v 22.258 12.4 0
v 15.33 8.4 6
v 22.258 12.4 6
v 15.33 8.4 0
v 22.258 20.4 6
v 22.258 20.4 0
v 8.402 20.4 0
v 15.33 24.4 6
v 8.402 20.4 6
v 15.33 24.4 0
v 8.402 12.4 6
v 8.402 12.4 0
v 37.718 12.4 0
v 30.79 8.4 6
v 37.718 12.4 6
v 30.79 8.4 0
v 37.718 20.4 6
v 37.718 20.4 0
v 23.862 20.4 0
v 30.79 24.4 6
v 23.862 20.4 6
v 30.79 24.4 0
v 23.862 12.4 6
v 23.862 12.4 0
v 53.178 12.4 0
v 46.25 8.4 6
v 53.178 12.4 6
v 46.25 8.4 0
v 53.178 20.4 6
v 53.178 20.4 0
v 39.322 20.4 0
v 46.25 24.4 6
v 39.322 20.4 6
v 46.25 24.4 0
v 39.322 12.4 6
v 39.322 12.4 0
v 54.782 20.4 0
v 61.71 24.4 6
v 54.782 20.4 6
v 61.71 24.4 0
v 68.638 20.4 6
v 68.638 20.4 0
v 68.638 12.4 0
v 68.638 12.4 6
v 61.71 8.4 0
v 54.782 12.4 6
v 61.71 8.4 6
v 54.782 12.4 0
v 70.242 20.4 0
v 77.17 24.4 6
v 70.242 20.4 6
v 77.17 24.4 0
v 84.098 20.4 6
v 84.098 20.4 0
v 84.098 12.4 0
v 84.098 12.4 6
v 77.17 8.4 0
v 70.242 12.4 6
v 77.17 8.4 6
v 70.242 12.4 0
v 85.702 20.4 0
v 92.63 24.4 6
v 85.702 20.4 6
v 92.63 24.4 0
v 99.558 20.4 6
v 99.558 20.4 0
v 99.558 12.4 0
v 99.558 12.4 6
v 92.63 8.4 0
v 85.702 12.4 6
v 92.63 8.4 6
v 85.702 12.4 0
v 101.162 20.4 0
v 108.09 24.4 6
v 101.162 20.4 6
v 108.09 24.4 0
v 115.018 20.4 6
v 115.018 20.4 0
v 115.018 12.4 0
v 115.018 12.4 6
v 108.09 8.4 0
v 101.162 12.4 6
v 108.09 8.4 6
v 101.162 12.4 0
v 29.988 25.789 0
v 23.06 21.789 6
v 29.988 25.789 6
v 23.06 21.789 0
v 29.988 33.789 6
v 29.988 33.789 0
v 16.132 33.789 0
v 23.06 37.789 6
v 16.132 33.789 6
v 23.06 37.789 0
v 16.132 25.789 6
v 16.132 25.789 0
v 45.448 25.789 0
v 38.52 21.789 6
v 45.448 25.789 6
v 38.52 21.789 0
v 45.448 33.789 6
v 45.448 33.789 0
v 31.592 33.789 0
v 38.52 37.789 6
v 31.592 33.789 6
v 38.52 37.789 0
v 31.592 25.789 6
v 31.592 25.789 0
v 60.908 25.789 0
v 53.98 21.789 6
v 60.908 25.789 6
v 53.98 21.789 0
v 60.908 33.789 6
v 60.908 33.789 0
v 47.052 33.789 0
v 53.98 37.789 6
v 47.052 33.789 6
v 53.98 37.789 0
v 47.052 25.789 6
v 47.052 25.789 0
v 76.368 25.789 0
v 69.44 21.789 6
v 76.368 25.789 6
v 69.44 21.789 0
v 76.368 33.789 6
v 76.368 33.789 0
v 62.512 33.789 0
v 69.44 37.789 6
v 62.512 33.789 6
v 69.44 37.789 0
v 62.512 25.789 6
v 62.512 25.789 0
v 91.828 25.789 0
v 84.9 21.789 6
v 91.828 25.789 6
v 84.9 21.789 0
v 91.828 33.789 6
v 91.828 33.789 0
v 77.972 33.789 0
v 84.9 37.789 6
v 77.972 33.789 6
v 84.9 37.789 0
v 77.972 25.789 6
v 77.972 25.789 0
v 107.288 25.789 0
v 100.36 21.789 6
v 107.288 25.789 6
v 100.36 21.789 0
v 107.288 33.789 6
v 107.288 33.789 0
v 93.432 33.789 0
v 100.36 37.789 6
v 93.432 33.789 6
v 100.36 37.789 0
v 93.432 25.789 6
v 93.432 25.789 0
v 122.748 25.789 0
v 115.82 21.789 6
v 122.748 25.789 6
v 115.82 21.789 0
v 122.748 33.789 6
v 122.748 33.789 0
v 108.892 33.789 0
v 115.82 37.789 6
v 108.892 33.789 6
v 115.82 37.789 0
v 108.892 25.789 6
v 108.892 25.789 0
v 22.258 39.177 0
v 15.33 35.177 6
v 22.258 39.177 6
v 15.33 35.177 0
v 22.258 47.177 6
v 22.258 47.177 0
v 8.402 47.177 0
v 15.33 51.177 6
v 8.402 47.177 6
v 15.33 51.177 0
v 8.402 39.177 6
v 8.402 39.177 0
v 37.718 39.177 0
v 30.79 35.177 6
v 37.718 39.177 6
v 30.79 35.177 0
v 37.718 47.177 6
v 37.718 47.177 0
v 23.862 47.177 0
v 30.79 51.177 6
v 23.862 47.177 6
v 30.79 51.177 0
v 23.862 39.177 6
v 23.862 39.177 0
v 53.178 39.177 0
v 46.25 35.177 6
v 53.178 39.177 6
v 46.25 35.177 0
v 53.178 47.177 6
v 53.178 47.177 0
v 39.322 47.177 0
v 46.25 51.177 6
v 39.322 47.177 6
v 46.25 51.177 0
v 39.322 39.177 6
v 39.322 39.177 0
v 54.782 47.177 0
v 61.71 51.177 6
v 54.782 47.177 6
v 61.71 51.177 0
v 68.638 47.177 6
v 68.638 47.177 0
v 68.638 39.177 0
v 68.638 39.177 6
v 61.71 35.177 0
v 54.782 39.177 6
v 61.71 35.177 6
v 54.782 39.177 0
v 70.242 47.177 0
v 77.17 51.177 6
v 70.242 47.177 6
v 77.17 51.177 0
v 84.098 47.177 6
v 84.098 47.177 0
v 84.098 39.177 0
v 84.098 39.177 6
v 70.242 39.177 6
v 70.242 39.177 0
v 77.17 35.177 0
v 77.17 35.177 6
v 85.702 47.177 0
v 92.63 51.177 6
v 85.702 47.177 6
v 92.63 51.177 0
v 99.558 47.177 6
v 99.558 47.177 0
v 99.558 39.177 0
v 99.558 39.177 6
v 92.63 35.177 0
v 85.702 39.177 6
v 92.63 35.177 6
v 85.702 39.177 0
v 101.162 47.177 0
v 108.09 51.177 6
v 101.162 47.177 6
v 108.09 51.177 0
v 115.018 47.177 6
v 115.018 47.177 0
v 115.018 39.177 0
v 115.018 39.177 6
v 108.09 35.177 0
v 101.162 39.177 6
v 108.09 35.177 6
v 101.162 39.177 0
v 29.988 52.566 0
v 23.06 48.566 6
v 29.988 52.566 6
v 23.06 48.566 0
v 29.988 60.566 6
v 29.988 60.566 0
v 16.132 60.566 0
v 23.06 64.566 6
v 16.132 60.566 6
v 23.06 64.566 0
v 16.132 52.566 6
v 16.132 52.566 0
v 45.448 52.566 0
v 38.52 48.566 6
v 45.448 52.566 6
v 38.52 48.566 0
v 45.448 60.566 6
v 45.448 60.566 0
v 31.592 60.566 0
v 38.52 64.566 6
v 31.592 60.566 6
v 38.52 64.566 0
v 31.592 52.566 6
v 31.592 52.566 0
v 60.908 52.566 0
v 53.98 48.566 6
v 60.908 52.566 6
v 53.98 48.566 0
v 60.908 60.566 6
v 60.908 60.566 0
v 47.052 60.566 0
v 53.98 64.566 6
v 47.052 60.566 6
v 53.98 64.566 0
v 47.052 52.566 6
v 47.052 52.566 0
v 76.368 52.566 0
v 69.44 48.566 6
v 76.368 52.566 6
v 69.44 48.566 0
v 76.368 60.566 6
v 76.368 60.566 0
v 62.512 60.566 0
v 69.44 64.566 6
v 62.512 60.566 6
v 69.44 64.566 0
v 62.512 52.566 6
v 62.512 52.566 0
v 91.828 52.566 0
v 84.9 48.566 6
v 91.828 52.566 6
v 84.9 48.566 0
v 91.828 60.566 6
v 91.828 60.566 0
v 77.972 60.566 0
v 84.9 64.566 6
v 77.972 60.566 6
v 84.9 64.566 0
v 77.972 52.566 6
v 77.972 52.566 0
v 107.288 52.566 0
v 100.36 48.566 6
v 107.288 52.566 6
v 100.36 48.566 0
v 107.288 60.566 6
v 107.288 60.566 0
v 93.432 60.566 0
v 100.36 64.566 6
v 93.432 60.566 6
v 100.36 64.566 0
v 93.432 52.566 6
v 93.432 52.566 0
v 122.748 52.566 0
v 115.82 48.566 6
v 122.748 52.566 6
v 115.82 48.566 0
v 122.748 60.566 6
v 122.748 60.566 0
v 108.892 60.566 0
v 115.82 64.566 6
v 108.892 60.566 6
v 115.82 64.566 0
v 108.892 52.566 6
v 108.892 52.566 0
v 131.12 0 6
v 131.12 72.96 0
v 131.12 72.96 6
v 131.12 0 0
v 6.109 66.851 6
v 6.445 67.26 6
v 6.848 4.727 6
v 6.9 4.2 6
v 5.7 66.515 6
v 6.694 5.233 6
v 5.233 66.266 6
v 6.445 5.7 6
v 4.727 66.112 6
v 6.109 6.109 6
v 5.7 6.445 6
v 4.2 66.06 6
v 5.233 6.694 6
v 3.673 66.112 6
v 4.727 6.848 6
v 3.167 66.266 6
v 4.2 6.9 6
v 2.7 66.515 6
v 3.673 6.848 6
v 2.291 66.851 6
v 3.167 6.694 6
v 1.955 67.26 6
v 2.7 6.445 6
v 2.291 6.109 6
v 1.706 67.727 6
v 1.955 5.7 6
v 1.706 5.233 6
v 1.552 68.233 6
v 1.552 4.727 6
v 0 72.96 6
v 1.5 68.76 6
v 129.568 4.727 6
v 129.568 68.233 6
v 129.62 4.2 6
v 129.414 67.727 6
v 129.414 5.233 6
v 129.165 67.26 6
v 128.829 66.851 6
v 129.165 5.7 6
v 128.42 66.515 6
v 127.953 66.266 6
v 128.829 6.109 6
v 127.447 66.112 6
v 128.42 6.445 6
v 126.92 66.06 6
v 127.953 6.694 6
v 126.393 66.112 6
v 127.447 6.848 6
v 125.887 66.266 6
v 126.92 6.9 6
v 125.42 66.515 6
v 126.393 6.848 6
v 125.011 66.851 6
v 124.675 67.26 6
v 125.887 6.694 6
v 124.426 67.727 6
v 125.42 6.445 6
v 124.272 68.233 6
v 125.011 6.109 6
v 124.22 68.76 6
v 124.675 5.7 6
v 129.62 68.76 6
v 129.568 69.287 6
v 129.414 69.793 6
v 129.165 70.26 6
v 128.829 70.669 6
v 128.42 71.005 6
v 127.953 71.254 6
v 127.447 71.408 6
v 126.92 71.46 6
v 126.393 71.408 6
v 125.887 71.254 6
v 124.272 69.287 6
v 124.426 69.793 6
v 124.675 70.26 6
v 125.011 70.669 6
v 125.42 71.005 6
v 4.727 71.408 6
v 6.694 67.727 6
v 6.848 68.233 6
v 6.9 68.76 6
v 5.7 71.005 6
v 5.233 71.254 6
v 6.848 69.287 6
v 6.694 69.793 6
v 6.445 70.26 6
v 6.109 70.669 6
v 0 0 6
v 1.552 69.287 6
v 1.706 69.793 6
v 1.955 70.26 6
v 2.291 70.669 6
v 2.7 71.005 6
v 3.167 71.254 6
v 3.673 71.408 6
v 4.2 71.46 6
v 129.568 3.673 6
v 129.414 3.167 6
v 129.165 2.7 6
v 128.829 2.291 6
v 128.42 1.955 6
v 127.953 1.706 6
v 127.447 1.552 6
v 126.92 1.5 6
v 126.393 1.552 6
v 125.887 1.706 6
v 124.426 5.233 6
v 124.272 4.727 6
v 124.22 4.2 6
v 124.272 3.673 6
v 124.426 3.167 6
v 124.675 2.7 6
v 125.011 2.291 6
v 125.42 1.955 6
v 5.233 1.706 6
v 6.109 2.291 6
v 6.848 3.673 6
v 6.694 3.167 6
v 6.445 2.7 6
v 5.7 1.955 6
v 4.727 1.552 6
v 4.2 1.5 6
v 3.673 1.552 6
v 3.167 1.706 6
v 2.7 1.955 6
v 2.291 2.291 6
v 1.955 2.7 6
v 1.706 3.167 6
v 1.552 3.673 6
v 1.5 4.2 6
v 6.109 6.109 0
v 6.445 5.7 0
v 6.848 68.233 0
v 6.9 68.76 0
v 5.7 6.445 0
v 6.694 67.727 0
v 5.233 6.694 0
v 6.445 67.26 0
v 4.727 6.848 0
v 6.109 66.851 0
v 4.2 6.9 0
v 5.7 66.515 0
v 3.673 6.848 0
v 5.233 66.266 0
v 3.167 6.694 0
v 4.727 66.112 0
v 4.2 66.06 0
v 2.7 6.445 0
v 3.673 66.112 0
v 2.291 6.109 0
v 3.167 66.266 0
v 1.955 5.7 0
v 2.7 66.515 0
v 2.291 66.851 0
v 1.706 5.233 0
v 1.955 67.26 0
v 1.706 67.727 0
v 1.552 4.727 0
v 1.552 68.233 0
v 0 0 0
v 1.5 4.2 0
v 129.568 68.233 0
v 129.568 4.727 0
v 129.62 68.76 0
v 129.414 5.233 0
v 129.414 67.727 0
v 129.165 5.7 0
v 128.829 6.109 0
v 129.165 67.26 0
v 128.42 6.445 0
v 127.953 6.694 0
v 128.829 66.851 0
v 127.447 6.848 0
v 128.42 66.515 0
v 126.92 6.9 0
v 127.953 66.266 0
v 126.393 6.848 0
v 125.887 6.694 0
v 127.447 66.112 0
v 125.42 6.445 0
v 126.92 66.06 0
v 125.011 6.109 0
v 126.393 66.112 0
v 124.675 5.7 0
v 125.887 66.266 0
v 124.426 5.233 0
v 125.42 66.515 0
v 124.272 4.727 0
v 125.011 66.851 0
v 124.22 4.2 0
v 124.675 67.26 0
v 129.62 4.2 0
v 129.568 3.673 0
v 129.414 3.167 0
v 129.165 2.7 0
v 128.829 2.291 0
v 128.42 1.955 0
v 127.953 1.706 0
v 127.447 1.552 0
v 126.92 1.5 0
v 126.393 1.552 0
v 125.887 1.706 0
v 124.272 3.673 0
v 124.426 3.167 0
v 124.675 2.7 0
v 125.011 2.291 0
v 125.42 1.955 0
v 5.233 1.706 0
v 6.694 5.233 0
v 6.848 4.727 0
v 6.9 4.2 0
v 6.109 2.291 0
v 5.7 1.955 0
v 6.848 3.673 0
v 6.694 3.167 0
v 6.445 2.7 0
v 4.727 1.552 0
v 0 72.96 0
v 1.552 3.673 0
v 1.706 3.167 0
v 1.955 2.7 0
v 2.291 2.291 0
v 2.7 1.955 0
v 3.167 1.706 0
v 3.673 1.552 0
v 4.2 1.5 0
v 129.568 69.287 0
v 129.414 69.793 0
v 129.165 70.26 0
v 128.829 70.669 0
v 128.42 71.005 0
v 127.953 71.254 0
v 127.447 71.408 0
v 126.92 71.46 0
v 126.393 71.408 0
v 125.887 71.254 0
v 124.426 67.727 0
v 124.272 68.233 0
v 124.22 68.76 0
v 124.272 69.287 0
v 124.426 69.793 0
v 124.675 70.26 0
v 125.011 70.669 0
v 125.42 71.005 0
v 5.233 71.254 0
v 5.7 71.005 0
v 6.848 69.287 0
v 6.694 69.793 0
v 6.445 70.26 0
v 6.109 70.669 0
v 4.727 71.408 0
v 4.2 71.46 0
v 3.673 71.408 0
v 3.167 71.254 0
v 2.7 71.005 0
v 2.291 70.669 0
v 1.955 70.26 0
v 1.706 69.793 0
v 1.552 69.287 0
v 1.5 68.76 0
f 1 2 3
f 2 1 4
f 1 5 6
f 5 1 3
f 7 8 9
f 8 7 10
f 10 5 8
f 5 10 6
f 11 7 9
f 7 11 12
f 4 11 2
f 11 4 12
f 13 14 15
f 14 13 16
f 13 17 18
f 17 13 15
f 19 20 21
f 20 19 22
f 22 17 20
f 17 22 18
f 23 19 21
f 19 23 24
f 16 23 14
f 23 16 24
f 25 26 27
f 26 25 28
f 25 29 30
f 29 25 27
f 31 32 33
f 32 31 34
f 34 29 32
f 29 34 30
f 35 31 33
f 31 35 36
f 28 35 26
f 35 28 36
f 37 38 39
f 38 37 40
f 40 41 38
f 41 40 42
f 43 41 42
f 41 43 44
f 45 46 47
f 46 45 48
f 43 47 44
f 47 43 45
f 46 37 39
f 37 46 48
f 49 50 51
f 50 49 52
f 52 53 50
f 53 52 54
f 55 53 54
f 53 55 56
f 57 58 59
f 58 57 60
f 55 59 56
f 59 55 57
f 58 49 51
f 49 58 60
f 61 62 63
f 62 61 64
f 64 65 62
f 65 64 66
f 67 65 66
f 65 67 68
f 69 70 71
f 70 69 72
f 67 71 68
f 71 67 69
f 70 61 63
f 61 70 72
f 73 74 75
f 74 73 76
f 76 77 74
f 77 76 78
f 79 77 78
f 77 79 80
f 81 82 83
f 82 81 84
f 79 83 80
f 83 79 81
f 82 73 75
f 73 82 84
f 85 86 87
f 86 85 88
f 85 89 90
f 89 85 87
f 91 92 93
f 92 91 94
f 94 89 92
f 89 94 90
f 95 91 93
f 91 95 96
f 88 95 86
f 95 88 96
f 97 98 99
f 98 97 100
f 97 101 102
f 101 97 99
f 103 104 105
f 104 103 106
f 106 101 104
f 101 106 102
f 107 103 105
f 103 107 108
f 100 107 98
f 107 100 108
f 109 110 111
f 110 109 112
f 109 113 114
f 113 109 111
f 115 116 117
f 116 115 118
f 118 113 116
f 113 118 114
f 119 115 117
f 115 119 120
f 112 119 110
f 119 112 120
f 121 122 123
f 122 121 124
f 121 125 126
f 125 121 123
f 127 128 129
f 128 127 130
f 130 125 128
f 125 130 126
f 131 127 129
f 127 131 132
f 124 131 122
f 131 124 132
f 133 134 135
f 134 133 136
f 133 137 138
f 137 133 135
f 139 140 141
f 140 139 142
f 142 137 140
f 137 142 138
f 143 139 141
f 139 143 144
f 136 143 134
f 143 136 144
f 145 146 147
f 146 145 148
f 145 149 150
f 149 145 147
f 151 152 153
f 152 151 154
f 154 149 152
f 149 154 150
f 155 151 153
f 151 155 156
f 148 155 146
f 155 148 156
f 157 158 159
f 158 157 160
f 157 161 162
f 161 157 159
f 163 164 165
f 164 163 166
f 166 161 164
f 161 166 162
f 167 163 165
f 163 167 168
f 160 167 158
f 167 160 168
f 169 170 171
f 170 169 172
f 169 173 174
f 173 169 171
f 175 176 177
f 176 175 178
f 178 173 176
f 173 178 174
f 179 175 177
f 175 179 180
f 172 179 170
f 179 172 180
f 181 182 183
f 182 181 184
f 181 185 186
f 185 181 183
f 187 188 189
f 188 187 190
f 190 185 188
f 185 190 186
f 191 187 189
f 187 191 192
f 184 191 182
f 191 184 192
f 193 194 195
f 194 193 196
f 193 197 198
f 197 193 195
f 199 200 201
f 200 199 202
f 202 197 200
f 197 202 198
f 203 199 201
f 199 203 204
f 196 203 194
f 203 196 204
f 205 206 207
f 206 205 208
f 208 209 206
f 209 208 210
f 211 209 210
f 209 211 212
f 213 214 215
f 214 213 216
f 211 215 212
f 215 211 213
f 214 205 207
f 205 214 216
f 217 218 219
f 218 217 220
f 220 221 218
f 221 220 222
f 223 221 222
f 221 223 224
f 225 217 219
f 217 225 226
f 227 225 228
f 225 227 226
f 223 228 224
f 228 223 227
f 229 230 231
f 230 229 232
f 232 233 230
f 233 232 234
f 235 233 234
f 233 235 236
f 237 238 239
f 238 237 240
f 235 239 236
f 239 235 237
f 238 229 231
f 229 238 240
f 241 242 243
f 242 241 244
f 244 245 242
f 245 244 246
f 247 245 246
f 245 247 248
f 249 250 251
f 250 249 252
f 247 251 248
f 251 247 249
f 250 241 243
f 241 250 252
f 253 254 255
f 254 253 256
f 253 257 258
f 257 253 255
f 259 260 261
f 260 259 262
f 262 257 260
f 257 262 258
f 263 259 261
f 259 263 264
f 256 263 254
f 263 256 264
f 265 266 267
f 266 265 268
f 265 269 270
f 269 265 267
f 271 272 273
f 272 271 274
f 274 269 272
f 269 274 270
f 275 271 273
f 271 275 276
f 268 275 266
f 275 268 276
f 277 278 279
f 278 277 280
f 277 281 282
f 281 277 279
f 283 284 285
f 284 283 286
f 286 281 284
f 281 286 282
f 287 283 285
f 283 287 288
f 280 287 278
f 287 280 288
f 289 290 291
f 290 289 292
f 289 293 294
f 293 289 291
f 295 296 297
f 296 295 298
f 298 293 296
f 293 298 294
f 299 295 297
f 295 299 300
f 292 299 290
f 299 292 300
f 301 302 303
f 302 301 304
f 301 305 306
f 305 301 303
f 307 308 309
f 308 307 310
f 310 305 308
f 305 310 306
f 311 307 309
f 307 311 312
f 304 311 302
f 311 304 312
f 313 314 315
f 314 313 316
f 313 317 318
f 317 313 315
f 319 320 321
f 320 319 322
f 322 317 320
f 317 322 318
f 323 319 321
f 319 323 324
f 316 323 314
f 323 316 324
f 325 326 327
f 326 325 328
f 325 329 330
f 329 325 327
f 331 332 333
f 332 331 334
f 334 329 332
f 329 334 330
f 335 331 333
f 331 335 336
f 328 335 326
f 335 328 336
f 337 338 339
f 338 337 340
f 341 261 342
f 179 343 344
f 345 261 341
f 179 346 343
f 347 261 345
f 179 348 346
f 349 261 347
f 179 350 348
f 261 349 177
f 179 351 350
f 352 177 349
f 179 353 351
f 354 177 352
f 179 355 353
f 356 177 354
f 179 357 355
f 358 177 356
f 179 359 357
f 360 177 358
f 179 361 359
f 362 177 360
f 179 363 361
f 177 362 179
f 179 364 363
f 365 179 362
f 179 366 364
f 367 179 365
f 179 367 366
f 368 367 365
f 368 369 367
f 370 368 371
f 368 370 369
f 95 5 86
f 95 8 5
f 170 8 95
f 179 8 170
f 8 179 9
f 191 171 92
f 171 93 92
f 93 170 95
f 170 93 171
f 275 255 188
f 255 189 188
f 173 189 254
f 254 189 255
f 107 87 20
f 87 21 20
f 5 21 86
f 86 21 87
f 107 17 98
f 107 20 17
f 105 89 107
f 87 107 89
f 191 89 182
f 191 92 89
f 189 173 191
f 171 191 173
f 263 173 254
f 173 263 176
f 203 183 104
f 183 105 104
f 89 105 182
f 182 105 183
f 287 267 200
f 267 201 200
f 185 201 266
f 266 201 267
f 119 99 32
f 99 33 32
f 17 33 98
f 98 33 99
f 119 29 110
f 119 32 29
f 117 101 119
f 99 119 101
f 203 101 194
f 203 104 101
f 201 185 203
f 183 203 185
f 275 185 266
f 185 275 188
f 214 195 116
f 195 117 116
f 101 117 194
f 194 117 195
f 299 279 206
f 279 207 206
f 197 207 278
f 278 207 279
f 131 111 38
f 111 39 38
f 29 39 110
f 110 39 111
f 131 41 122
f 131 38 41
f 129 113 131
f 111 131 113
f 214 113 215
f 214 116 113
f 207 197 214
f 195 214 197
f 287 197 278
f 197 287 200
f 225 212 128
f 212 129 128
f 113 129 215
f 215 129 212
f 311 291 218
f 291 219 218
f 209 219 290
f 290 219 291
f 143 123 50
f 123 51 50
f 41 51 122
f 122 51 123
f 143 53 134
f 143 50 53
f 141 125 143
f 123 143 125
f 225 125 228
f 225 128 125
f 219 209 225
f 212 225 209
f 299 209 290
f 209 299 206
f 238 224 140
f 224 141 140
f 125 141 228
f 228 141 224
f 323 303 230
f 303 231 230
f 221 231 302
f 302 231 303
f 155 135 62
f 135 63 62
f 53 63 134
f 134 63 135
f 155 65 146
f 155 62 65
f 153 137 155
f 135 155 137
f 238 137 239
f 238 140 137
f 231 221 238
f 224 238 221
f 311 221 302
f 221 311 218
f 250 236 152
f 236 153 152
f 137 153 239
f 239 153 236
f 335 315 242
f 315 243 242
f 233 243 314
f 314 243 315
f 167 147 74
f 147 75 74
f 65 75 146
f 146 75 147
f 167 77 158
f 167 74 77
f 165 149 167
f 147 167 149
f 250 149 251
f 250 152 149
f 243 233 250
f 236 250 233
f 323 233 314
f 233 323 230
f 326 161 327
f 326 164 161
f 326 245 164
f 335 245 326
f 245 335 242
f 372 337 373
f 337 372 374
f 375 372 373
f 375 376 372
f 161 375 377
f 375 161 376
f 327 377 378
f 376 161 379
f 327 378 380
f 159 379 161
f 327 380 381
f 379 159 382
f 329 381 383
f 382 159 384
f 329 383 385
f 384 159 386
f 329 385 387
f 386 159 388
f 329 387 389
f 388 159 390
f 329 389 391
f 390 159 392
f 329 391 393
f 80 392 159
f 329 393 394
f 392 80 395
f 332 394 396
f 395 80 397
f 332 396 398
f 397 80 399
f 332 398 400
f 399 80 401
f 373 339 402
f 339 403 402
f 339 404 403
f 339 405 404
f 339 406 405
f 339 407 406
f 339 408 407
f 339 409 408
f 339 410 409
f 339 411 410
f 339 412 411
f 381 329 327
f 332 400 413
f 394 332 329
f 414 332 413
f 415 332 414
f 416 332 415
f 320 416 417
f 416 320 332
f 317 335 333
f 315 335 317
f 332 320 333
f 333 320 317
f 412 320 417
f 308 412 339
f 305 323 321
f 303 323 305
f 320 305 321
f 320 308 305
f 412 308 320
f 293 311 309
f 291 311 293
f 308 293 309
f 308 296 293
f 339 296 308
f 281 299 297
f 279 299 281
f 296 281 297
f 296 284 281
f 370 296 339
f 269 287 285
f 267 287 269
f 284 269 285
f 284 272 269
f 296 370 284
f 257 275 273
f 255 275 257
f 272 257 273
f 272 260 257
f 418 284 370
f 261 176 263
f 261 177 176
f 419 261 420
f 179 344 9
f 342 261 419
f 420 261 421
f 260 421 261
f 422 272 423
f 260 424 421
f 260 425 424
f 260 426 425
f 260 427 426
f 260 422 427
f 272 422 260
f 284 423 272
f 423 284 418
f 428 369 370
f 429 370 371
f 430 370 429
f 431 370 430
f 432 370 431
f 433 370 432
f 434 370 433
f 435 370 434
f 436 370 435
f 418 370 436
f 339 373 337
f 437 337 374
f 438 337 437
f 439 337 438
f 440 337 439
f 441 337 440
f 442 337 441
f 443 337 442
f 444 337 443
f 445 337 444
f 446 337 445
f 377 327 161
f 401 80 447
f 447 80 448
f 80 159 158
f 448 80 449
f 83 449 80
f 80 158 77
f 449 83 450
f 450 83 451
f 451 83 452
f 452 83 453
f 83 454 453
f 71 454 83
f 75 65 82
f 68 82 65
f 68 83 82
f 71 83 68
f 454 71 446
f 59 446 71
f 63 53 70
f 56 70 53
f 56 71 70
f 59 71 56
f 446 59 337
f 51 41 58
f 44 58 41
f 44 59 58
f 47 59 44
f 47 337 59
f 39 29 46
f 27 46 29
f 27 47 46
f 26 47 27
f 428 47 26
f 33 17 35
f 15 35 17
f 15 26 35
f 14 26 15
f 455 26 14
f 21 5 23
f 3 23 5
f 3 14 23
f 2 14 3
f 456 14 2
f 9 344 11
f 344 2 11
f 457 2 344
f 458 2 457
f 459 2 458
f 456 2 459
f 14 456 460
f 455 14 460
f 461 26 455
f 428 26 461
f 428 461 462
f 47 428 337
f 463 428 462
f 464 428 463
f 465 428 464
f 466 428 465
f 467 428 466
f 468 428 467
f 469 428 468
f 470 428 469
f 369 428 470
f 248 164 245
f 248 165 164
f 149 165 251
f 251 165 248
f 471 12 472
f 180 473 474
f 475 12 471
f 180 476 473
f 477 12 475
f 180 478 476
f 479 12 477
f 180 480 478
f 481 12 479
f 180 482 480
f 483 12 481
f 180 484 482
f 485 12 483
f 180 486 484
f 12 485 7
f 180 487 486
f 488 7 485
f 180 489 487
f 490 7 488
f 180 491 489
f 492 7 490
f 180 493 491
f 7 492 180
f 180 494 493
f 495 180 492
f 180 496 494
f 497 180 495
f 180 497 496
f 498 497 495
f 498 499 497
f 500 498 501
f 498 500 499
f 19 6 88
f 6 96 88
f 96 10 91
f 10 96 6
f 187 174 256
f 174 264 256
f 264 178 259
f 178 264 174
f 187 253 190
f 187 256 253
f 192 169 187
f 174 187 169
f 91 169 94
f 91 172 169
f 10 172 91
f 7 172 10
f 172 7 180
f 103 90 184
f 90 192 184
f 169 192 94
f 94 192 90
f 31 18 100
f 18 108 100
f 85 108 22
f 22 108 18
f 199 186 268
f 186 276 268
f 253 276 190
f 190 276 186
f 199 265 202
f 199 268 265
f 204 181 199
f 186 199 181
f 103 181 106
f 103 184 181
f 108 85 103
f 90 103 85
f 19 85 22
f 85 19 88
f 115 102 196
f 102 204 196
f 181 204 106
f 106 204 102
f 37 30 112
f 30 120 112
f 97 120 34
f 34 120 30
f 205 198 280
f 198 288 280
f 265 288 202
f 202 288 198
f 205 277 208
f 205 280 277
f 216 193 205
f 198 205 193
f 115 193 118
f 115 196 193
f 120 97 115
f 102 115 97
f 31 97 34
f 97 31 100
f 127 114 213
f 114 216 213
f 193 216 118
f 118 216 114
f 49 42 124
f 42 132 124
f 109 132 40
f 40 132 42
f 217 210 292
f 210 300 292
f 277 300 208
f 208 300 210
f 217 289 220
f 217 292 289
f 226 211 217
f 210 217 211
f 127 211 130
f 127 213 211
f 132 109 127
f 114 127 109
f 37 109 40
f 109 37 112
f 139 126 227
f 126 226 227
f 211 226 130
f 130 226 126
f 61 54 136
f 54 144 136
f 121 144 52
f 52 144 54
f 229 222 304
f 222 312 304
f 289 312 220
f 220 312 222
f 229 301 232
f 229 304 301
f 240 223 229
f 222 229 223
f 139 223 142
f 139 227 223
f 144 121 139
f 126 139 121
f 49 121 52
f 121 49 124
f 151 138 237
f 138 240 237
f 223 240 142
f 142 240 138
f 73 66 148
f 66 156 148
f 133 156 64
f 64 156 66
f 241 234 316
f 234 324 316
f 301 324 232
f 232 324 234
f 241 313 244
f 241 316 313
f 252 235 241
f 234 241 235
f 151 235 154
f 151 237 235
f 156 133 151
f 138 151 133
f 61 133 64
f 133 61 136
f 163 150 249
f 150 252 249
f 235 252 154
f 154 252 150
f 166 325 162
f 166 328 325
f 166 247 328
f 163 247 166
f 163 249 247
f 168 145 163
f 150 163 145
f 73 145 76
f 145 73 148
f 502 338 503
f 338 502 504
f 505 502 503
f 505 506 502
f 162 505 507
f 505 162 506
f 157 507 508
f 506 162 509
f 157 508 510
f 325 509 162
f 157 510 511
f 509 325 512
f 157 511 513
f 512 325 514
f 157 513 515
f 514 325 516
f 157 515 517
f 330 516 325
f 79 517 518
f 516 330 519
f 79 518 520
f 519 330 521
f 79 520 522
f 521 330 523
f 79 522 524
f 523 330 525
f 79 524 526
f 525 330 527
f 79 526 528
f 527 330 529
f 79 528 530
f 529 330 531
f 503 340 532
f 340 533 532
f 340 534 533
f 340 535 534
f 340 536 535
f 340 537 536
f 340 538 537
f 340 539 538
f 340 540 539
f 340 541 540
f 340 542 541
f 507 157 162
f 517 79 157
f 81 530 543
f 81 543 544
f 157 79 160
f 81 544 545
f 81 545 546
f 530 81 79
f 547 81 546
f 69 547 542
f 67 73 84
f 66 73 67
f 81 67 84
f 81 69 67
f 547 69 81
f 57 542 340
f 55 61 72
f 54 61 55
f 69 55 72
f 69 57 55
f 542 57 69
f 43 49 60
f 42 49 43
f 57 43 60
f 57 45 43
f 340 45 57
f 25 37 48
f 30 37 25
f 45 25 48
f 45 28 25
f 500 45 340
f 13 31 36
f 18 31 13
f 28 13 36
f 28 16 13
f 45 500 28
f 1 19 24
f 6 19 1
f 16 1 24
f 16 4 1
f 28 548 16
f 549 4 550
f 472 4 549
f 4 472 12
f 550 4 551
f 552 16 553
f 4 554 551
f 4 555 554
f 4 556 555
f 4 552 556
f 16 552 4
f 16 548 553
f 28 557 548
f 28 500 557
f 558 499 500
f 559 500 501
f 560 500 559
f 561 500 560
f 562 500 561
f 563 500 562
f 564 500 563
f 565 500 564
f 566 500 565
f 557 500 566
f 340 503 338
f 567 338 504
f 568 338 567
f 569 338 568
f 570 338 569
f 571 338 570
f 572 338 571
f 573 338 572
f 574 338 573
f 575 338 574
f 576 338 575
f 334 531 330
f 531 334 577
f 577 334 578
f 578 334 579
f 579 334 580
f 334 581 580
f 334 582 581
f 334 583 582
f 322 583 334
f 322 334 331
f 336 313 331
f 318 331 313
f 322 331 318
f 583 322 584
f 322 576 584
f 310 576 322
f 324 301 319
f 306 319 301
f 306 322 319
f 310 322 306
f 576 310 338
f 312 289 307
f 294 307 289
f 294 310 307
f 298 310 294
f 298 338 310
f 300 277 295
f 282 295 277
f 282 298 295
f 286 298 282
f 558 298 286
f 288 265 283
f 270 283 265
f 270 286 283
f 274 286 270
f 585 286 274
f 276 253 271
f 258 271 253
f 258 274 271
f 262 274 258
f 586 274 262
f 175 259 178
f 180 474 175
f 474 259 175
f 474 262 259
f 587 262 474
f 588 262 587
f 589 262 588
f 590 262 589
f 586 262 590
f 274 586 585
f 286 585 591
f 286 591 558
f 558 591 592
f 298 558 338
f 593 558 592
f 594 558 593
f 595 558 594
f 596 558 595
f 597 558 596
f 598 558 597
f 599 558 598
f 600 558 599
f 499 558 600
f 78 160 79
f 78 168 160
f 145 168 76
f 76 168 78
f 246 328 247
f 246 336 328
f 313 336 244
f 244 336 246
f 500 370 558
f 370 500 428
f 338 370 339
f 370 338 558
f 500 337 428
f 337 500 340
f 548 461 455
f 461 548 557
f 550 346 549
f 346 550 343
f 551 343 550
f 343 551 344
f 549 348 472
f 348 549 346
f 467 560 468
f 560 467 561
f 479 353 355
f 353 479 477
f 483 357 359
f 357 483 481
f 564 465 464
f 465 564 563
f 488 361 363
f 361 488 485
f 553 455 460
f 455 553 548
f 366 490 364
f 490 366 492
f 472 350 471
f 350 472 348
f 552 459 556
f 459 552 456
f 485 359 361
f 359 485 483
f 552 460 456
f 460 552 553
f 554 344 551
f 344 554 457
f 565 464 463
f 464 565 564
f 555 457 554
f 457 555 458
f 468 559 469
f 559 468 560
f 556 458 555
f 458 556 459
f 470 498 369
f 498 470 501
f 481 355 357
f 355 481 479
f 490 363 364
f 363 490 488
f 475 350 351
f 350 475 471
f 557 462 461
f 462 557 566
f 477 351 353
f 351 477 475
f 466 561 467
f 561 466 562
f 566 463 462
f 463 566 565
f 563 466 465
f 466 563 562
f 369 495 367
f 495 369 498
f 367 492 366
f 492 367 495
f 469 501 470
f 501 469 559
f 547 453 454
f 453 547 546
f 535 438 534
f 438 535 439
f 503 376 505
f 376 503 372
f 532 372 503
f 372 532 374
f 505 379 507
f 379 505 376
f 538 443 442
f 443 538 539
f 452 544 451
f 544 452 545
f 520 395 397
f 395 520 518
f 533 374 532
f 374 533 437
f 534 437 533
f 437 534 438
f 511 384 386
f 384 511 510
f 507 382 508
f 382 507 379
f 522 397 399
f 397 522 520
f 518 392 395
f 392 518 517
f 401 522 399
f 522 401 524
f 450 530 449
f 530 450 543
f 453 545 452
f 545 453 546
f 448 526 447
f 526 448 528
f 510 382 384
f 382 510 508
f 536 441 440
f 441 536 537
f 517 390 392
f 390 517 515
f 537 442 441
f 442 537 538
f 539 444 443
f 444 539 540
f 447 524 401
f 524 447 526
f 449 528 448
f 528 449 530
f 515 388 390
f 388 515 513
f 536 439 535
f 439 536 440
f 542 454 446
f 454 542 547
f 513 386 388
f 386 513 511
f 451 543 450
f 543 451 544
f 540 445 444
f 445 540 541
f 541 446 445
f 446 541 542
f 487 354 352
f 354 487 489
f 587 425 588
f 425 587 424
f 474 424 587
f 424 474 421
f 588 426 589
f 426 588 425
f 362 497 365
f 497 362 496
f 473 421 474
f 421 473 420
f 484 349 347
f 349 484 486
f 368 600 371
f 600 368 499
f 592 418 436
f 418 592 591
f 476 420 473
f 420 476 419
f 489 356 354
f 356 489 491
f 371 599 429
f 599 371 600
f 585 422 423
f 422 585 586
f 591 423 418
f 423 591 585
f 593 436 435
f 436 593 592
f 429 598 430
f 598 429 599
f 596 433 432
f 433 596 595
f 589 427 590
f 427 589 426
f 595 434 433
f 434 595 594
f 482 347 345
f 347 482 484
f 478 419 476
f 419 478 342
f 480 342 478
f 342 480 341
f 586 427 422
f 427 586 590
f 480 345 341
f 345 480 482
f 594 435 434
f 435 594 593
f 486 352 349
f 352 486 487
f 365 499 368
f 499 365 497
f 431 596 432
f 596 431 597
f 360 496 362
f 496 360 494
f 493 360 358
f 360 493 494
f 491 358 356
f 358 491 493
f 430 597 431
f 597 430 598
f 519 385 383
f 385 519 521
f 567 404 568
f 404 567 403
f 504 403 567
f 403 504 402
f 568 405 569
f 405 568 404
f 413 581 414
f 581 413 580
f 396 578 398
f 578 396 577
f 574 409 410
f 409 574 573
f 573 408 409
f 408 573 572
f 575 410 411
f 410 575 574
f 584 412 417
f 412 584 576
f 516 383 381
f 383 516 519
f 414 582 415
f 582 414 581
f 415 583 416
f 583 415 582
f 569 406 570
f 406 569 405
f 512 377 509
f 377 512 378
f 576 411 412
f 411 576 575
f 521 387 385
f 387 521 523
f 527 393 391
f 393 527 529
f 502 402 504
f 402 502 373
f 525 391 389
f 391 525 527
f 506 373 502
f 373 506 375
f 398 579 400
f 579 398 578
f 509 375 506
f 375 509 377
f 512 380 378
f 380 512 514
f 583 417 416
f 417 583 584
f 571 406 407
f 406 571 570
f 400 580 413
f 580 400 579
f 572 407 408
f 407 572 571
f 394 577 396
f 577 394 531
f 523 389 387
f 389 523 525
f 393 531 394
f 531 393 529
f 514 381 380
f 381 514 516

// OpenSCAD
$fn = 32;

// ----------------------------------------------------------------------
// Honeycomb panel: 131.12 x 72.96 mm, 28 cells of 16 mm
// ----------------------------------------------------------------------

// --- parameters (mm) ---
panel_w = 131.12;         // panel width
panel_d = 72.96;          // panel depth
thick = 6;                // panel thickness
cell_r = 8;               // hex cell circumradius
pitch = 15.46;            // hex cell pitch (centre to centre)
web = 1.6;                // web between the cells
columns = 7;              // columns of cells
rows = 4;                 // rows of cells
cell_count = 28;          // total cells
shift_x = 15.33;          // first cell offset in x
shift_y = 16.4;           // first cell offset in y
mount_d = 5.4;            // corner mounting holes
hole_off = 4.2;           // mounting hole offset from the corners

difference() {
  union() {
    cube([panel_w, panel_d, thick]);
  }
  /* hexagonal cells, point-up, cut right through the plate */
  for (row = [0 : rows - 1]) {
    for (col = [0 : columns - 1]) {
      translate([shift_x + col * pitch + (row % 2) * pitch / 2, shift_y + row * pitch * 0.866025, -2.5]) rotate([0, 0, 30]) cylinder(h = thick + 5, d = 2 * cell_r, $fn = 6);
    }
  }
  /* corner mounting holes, clear of the outer cell web */
  translate([4.2, 4.2, -2.5]) cylinder(h = thick + 5, d = mount_d);
  translate([126.92, 4.2, -2.5]) cylinder(h = thick + 5, d = mount_d);
  translate([4.2, 68.76, -2.5]) cylinder(h = thick + 5, d = mount_d);
  translate([126.92, 68.76, -2.5]) cylinder(h = thick + 5, d = mount_d);
}
